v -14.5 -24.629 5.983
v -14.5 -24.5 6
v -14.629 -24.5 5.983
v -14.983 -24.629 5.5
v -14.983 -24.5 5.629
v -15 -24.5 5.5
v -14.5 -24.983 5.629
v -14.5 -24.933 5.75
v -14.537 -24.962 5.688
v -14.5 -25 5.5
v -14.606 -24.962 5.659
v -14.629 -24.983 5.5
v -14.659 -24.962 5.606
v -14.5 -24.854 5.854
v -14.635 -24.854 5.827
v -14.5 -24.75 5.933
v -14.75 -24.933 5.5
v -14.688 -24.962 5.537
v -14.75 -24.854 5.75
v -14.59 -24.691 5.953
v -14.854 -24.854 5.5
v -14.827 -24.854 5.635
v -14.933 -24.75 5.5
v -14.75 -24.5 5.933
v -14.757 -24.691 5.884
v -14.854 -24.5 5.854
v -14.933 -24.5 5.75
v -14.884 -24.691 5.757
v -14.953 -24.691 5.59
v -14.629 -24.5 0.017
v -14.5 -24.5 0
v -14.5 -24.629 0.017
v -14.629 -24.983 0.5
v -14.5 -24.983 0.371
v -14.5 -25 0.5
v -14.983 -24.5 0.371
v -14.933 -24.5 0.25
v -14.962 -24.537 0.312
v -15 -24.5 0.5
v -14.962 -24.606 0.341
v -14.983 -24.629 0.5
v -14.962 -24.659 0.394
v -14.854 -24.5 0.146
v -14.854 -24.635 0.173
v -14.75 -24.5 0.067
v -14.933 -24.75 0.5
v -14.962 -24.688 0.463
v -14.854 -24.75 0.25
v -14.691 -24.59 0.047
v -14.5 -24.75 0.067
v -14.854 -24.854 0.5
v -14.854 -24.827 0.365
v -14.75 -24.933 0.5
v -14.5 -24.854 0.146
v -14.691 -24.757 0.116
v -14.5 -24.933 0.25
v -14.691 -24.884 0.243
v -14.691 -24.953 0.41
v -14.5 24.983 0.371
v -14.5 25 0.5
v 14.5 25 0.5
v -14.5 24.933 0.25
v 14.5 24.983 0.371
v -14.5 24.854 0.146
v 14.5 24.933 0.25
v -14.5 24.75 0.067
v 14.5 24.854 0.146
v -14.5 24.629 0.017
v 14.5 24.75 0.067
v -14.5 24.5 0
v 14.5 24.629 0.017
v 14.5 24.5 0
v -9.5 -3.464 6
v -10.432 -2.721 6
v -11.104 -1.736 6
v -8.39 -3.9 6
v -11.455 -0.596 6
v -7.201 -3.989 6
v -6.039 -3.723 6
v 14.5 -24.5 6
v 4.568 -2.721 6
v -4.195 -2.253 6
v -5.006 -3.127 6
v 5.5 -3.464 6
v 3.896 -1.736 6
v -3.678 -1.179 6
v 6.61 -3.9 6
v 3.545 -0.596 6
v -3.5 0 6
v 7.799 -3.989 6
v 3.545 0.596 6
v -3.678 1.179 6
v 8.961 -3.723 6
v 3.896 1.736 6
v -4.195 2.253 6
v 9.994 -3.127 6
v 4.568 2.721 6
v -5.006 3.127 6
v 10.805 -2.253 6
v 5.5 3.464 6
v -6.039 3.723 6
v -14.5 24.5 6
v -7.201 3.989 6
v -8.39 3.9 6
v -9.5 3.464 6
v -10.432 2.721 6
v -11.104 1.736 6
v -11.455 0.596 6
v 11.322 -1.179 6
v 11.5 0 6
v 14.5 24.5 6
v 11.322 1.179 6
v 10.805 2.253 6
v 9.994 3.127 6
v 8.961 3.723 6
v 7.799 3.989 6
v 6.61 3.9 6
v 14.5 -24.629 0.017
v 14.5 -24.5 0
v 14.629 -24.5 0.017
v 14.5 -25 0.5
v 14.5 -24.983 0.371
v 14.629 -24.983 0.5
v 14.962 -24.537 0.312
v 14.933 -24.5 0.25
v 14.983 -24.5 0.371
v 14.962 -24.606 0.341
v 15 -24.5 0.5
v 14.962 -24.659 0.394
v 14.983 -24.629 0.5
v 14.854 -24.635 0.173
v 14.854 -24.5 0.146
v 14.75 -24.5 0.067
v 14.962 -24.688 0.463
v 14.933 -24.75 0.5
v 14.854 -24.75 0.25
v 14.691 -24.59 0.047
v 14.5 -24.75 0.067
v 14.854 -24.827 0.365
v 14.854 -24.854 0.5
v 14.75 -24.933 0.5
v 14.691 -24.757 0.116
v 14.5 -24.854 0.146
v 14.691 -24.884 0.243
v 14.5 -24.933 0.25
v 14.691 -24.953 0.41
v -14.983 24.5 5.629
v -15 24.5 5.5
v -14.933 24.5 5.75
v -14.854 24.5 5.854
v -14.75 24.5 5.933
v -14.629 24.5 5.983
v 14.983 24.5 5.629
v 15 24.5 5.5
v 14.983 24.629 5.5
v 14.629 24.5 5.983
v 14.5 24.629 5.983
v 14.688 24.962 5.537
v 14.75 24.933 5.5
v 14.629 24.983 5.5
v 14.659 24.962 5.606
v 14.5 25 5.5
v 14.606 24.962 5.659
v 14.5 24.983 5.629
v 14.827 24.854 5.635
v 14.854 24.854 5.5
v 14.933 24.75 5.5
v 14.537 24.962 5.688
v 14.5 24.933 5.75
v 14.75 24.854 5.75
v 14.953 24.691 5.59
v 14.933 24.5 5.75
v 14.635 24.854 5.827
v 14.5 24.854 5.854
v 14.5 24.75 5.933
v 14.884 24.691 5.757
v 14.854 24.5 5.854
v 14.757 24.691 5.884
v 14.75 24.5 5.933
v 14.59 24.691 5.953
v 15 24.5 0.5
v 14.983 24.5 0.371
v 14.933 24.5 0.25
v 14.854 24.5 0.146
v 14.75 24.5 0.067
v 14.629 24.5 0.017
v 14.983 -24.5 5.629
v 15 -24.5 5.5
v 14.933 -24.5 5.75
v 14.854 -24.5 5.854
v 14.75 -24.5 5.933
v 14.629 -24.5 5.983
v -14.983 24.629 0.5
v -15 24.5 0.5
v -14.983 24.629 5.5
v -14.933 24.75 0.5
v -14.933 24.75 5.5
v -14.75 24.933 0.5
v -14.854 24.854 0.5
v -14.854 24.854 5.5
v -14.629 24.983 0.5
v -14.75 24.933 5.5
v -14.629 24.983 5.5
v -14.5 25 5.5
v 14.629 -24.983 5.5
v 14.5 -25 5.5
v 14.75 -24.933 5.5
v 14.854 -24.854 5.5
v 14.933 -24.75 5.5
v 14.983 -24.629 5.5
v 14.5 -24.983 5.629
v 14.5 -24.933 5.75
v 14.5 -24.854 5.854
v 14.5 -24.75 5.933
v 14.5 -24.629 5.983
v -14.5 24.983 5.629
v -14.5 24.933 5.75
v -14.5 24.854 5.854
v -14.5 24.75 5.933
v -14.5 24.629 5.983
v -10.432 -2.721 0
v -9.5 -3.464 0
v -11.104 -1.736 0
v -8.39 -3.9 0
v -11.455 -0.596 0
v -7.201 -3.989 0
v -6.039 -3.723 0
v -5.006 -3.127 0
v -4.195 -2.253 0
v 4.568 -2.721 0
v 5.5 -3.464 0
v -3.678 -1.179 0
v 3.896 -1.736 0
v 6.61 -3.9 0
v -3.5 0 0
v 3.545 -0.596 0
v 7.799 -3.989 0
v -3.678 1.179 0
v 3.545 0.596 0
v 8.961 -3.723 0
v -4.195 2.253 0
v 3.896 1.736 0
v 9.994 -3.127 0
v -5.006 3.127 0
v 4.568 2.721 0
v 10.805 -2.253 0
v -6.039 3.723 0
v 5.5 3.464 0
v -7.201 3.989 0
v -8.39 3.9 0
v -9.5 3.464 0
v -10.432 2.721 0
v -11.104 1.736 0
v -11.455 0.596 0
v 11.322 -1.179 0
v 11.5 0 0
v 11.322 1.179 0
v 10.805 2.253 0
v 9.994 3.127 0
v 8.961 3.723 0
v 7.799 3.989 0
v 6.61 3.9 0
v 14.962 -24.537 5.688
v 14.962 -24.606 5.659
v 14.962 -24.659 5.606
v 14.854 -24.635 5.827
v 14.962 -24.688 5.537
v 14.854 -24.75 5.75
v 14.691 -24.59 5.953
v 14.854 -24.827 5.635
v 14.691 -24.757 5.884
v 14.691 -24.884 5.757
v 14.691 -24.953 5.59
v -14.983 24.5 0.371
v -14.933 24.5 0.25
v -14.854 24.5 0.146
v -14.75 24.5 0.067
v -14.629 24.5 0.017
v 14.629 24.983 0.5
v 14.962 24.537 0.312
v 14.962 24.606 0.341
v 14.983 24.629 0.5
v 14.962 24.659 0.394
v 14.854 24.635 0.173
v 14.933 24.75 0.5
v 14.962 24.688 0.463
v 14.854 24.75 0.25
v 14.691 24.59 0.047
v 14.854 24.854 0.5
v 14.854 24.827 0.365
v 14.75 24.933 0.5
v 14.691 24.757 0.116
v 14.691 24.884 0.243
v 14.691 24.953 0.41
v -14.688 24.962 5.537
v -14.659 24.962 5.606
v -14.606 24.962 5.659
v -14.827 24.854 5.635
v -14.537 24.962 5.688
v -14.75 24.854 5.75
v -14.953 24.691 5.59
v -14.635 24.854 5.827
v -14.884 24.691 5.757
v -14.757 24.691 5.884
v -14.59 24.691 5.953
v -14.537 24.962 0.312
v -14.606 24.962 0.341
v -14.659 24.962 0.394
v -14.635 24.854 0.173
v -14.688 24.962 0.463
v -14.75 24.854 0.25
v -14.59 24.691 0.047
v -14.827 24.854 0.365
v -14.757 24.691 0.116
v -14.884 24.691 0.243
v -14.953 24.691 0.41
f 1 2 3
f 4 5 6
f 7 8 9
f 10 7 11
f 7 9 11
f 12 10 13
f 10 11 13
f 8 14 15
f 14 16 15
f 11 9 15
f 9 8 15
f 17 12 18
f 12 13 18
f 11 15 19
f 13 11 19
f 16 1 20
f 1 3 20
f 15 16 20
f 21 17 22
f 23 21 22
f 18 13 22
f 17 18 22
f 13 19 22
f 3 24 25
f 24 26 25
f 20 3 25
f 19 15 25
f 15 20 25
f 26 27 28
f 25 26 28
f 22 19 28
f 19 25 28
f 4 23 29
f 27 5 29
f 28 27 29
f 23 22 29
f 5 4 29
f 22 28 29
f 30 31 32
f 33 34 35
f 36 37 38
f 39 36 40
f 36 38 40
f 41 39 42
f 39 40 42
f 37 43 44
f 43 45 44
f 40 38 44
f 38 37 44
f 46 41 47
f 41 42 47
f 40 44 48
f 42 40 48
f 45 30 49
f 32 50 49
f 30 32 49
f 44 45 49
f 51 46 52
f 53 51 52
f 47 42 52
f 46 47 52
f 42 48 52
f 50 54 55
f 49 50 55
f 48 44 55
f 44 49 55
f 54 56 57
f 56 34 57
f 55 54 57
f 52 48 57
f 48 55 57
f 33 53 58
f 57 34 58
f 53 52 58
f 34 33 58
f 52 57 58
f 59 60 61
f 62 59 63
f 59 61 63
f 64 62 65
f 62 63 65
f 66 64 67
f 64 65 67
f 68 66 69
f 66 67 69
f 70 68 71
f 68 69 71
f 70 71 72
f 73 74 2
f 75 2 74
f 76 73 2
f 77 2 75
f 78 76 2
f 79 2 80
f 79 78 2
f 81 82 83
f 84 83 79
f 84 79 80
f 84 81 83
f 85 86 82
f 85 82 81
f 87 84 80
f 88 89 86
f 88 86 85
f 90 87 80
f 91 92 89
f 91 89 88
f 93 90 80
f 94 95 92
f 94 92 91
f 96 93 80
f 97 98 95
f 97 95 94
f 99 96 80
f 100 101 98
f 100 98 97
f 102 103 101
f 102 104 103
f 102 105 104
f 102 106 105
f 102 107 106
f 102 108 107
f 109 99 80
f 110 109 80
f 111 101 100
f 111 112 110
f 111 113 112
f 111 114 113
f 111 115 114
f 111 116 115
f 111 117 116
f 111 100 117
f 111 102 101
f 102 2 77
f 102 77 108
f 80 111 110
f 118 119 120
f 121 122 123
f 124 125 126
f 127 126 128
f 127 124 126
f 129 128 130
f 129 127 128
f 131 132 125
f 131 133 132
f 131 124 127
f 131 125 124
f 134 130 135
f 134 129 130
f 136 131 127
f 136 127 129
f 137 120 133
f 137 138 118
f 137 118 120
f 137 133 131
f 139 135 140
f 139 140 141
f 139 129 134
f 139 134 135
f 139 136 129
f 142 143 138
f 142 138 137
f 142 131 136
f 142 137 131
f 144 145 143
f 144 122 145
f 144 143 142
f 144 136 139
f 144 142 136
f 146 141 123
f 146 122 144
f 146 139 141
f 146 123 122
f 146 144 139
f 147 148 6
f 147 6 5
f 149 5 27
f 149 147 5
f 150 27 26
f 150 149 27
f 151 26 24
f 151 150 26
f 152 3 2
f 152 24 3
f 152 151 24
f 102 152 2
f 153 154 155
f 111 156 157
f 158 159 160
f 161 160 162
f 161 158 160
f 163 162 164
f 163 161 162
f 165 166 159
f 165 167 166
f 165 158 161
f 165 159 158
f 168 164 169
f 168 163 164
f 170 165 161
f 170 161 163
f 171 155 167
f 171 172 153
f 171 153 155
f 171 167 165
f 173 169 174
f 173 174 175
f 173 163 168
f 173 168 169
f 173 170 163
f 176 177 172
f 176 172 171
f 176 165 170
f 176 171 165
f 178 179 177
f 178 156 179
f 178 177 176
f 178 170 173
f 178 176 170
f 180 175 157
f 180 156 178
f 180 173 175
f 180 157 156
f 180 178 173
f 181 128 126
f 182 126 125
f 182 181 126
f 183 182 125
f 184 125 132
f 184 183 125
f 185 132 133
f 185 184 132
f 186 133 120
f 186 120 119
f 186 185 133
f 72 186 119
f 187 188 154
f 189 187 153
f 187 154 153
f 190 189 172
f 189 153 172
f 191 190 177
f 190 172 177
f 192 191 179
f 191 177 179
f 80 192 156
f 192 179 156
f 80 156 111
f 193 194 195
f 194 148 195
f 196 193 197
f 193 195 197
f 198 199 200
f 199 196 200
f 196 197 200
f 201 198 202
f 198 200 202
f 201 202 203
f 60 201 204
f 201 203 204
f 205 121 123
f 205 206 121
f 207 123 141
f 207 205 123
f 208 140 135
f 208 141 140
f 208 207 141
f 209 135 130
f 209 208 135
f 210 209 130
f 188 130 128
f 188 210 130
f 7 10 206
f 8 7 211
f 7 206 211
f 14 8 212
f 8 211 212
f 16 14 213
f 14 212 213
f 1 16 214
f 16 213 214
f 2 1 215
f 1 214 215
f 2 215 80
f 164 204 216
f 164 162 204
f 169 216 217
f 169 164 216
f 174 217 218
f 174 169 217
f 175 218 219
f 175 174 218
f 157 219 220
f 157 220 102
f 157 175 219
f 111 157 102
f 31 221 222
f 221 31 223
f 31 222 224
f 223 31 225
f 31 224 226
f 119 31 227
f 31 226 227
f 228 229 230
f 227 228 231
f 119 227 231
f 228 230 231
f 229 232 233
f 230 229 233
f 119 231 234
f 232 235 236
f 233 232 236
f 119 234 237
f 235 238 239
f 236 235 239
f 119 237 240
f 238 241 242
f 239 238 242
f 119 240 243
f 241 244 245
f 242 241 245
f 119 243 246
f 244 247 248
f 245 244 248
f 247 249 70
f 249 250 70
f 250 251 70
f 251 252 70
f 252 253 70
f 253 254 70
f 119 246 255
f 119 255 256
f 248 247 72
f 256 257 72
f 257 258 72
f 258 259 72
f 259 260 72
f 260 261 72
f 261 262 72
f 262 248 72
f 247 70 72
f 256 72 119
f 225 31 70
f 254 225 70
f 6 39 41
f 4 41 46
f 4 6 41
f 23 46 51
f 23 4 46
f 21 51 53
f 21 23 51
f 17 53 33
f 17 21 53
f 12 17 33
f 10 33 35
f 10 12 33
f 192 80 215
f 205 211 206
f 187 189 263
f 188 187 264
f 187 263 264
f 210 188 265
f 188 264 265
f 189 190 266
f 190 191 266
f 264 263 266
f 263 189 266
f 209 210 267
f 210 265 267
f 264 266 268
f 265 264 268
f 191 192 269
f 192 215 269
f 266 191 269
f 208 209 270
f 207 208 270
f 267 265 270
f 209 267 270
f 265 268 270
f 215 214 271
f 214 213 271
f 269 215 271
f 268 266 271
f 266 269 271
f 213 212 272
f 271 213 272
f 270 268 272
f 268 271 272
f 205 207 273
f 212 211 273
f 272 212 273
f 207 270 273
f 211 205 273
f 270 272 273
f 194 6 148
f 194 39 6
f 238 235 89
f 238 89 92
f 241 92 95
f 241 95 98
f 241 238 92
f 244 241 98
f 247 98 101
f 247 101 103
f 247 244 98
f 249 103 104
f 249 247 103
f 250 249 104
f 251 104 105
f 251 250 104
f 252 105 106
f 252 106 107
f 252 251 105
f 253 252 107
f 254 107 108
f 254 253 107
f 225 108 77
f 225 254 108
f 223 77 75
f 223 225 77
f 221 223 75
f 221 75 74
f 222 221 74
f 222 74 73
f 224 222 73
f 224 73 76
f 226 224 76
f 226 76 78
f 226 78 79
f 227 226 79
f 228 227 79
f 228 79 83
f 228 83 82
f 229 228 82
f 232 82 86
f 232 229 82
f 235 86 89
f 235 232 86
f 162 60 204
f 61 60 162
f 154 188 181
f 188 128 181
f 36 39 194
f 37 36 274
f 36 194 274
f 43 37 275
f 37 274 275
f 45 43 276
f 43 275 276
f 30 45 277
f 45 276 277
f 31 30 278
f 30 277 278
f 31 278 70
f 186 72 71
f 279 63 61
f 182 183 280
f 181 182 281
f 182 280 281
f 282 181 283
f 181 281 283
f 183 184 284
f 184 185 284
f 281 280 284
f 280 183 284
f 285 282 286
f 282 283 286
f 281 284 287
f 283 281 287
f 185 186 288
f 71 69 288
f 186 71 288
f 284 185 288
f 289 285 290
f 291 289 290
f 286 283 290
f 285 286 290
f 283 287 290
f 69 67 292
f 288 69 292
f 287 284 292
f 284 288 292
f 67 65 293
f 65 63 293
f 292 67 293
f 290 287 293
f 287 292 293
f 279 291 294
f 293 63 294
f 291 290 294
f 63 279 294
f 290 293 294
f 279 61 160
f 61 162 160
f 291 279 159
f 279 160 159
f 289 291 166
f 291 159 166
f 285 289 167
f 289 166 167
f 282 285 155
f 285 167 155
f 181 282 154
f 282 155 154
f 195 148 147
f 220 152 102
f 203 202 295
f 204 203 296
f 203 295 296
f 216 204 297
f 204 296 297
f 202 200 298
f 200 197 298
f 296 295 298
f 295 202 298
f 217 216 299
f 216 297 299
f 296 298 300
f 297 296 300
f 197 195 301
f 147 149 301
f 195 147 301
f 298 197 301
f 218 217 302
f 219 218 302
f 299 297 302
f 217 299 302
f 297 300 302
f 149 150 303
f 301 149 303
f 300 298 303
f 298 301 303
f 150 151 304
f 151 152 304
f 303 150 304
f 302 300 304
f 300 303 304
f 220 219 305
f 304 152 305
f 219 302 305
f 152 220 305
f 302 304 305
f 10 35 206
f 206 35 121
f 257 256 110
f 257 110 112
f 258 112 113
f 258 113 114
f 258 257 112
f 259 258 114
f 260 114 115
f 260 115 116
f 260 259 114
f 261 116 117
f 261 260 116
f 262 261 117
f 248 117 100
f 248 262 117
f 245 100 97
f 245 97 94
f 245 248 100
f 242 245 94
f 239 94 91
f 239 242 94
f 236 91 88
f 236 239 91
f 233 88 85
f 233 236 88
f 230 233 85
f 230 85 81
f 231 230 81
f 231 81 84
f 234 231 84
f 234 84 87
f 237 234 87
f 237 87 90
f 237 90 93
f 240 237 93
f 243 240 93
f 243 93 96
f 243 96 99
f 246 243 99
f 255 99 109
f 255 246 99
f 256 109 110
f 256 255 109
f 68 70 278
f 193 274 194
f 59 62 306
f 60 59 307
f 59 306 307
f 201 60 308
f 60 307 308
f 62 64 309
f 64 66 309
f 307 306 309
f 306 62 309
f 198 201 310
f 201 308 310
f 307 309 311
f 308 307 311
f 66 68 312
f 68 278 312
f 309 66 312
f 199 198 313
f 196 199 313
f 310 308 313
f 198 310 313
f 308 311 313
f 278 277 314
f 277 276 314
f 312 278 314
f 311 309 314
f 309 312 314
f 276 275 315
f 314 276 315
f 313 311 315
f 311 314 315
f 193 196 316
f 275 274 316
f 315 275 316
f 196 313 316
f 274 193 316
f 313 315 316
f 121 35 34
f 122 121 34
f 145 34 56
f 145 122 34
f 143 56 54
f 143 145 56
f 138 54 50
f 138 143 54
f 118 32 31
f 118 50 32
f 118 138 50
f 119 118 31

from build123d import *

# Parameters (mm, degrees)
SKETCH1_W           = 30
SKETCH1_H           = 50
SKETCH1_R           = 4
BOSS_EXTRUDE1_DEPTH = 6
FILLET1_R           = 0.5


with BuildPart() as part:
    # Sketch1 → Boss-Extrude1 (new body)
    with BuildSketch(Plane.XY):
        Rectangle(SKETCH1_W, SKETCH1_H)
        with Locations((-7.5, 0)):
            Circle(SKETCH1_R, mode=Mode.SUBTRACT)
        with Locations((7.5, 0)):
            Circle(SKETCH1_R, mode=Mode.SUBTRACT)
    extrude(amount=BOSS_EXTRUDE1_DEPTH)

    # Fillet1
    fillet1_edges = [part.edges().sort_by_distance(p)[0] for p in [
        (-15, 0, 6),
        (0, -25, 6),
        (15, 0, 6),
        (0, -25, 0),
        (-15, 0, 0),
        (0, 25, 0),
        (15, 0, 0),
        (15, -25, 3),
        (-15, -25, 3),
        (-15, 25, 3),
        (15, 25, 3),
        (0, 25, 6),
    ]]
    fillet(fillet1_edges, radius=FILLET1_R)


solid = part.part
